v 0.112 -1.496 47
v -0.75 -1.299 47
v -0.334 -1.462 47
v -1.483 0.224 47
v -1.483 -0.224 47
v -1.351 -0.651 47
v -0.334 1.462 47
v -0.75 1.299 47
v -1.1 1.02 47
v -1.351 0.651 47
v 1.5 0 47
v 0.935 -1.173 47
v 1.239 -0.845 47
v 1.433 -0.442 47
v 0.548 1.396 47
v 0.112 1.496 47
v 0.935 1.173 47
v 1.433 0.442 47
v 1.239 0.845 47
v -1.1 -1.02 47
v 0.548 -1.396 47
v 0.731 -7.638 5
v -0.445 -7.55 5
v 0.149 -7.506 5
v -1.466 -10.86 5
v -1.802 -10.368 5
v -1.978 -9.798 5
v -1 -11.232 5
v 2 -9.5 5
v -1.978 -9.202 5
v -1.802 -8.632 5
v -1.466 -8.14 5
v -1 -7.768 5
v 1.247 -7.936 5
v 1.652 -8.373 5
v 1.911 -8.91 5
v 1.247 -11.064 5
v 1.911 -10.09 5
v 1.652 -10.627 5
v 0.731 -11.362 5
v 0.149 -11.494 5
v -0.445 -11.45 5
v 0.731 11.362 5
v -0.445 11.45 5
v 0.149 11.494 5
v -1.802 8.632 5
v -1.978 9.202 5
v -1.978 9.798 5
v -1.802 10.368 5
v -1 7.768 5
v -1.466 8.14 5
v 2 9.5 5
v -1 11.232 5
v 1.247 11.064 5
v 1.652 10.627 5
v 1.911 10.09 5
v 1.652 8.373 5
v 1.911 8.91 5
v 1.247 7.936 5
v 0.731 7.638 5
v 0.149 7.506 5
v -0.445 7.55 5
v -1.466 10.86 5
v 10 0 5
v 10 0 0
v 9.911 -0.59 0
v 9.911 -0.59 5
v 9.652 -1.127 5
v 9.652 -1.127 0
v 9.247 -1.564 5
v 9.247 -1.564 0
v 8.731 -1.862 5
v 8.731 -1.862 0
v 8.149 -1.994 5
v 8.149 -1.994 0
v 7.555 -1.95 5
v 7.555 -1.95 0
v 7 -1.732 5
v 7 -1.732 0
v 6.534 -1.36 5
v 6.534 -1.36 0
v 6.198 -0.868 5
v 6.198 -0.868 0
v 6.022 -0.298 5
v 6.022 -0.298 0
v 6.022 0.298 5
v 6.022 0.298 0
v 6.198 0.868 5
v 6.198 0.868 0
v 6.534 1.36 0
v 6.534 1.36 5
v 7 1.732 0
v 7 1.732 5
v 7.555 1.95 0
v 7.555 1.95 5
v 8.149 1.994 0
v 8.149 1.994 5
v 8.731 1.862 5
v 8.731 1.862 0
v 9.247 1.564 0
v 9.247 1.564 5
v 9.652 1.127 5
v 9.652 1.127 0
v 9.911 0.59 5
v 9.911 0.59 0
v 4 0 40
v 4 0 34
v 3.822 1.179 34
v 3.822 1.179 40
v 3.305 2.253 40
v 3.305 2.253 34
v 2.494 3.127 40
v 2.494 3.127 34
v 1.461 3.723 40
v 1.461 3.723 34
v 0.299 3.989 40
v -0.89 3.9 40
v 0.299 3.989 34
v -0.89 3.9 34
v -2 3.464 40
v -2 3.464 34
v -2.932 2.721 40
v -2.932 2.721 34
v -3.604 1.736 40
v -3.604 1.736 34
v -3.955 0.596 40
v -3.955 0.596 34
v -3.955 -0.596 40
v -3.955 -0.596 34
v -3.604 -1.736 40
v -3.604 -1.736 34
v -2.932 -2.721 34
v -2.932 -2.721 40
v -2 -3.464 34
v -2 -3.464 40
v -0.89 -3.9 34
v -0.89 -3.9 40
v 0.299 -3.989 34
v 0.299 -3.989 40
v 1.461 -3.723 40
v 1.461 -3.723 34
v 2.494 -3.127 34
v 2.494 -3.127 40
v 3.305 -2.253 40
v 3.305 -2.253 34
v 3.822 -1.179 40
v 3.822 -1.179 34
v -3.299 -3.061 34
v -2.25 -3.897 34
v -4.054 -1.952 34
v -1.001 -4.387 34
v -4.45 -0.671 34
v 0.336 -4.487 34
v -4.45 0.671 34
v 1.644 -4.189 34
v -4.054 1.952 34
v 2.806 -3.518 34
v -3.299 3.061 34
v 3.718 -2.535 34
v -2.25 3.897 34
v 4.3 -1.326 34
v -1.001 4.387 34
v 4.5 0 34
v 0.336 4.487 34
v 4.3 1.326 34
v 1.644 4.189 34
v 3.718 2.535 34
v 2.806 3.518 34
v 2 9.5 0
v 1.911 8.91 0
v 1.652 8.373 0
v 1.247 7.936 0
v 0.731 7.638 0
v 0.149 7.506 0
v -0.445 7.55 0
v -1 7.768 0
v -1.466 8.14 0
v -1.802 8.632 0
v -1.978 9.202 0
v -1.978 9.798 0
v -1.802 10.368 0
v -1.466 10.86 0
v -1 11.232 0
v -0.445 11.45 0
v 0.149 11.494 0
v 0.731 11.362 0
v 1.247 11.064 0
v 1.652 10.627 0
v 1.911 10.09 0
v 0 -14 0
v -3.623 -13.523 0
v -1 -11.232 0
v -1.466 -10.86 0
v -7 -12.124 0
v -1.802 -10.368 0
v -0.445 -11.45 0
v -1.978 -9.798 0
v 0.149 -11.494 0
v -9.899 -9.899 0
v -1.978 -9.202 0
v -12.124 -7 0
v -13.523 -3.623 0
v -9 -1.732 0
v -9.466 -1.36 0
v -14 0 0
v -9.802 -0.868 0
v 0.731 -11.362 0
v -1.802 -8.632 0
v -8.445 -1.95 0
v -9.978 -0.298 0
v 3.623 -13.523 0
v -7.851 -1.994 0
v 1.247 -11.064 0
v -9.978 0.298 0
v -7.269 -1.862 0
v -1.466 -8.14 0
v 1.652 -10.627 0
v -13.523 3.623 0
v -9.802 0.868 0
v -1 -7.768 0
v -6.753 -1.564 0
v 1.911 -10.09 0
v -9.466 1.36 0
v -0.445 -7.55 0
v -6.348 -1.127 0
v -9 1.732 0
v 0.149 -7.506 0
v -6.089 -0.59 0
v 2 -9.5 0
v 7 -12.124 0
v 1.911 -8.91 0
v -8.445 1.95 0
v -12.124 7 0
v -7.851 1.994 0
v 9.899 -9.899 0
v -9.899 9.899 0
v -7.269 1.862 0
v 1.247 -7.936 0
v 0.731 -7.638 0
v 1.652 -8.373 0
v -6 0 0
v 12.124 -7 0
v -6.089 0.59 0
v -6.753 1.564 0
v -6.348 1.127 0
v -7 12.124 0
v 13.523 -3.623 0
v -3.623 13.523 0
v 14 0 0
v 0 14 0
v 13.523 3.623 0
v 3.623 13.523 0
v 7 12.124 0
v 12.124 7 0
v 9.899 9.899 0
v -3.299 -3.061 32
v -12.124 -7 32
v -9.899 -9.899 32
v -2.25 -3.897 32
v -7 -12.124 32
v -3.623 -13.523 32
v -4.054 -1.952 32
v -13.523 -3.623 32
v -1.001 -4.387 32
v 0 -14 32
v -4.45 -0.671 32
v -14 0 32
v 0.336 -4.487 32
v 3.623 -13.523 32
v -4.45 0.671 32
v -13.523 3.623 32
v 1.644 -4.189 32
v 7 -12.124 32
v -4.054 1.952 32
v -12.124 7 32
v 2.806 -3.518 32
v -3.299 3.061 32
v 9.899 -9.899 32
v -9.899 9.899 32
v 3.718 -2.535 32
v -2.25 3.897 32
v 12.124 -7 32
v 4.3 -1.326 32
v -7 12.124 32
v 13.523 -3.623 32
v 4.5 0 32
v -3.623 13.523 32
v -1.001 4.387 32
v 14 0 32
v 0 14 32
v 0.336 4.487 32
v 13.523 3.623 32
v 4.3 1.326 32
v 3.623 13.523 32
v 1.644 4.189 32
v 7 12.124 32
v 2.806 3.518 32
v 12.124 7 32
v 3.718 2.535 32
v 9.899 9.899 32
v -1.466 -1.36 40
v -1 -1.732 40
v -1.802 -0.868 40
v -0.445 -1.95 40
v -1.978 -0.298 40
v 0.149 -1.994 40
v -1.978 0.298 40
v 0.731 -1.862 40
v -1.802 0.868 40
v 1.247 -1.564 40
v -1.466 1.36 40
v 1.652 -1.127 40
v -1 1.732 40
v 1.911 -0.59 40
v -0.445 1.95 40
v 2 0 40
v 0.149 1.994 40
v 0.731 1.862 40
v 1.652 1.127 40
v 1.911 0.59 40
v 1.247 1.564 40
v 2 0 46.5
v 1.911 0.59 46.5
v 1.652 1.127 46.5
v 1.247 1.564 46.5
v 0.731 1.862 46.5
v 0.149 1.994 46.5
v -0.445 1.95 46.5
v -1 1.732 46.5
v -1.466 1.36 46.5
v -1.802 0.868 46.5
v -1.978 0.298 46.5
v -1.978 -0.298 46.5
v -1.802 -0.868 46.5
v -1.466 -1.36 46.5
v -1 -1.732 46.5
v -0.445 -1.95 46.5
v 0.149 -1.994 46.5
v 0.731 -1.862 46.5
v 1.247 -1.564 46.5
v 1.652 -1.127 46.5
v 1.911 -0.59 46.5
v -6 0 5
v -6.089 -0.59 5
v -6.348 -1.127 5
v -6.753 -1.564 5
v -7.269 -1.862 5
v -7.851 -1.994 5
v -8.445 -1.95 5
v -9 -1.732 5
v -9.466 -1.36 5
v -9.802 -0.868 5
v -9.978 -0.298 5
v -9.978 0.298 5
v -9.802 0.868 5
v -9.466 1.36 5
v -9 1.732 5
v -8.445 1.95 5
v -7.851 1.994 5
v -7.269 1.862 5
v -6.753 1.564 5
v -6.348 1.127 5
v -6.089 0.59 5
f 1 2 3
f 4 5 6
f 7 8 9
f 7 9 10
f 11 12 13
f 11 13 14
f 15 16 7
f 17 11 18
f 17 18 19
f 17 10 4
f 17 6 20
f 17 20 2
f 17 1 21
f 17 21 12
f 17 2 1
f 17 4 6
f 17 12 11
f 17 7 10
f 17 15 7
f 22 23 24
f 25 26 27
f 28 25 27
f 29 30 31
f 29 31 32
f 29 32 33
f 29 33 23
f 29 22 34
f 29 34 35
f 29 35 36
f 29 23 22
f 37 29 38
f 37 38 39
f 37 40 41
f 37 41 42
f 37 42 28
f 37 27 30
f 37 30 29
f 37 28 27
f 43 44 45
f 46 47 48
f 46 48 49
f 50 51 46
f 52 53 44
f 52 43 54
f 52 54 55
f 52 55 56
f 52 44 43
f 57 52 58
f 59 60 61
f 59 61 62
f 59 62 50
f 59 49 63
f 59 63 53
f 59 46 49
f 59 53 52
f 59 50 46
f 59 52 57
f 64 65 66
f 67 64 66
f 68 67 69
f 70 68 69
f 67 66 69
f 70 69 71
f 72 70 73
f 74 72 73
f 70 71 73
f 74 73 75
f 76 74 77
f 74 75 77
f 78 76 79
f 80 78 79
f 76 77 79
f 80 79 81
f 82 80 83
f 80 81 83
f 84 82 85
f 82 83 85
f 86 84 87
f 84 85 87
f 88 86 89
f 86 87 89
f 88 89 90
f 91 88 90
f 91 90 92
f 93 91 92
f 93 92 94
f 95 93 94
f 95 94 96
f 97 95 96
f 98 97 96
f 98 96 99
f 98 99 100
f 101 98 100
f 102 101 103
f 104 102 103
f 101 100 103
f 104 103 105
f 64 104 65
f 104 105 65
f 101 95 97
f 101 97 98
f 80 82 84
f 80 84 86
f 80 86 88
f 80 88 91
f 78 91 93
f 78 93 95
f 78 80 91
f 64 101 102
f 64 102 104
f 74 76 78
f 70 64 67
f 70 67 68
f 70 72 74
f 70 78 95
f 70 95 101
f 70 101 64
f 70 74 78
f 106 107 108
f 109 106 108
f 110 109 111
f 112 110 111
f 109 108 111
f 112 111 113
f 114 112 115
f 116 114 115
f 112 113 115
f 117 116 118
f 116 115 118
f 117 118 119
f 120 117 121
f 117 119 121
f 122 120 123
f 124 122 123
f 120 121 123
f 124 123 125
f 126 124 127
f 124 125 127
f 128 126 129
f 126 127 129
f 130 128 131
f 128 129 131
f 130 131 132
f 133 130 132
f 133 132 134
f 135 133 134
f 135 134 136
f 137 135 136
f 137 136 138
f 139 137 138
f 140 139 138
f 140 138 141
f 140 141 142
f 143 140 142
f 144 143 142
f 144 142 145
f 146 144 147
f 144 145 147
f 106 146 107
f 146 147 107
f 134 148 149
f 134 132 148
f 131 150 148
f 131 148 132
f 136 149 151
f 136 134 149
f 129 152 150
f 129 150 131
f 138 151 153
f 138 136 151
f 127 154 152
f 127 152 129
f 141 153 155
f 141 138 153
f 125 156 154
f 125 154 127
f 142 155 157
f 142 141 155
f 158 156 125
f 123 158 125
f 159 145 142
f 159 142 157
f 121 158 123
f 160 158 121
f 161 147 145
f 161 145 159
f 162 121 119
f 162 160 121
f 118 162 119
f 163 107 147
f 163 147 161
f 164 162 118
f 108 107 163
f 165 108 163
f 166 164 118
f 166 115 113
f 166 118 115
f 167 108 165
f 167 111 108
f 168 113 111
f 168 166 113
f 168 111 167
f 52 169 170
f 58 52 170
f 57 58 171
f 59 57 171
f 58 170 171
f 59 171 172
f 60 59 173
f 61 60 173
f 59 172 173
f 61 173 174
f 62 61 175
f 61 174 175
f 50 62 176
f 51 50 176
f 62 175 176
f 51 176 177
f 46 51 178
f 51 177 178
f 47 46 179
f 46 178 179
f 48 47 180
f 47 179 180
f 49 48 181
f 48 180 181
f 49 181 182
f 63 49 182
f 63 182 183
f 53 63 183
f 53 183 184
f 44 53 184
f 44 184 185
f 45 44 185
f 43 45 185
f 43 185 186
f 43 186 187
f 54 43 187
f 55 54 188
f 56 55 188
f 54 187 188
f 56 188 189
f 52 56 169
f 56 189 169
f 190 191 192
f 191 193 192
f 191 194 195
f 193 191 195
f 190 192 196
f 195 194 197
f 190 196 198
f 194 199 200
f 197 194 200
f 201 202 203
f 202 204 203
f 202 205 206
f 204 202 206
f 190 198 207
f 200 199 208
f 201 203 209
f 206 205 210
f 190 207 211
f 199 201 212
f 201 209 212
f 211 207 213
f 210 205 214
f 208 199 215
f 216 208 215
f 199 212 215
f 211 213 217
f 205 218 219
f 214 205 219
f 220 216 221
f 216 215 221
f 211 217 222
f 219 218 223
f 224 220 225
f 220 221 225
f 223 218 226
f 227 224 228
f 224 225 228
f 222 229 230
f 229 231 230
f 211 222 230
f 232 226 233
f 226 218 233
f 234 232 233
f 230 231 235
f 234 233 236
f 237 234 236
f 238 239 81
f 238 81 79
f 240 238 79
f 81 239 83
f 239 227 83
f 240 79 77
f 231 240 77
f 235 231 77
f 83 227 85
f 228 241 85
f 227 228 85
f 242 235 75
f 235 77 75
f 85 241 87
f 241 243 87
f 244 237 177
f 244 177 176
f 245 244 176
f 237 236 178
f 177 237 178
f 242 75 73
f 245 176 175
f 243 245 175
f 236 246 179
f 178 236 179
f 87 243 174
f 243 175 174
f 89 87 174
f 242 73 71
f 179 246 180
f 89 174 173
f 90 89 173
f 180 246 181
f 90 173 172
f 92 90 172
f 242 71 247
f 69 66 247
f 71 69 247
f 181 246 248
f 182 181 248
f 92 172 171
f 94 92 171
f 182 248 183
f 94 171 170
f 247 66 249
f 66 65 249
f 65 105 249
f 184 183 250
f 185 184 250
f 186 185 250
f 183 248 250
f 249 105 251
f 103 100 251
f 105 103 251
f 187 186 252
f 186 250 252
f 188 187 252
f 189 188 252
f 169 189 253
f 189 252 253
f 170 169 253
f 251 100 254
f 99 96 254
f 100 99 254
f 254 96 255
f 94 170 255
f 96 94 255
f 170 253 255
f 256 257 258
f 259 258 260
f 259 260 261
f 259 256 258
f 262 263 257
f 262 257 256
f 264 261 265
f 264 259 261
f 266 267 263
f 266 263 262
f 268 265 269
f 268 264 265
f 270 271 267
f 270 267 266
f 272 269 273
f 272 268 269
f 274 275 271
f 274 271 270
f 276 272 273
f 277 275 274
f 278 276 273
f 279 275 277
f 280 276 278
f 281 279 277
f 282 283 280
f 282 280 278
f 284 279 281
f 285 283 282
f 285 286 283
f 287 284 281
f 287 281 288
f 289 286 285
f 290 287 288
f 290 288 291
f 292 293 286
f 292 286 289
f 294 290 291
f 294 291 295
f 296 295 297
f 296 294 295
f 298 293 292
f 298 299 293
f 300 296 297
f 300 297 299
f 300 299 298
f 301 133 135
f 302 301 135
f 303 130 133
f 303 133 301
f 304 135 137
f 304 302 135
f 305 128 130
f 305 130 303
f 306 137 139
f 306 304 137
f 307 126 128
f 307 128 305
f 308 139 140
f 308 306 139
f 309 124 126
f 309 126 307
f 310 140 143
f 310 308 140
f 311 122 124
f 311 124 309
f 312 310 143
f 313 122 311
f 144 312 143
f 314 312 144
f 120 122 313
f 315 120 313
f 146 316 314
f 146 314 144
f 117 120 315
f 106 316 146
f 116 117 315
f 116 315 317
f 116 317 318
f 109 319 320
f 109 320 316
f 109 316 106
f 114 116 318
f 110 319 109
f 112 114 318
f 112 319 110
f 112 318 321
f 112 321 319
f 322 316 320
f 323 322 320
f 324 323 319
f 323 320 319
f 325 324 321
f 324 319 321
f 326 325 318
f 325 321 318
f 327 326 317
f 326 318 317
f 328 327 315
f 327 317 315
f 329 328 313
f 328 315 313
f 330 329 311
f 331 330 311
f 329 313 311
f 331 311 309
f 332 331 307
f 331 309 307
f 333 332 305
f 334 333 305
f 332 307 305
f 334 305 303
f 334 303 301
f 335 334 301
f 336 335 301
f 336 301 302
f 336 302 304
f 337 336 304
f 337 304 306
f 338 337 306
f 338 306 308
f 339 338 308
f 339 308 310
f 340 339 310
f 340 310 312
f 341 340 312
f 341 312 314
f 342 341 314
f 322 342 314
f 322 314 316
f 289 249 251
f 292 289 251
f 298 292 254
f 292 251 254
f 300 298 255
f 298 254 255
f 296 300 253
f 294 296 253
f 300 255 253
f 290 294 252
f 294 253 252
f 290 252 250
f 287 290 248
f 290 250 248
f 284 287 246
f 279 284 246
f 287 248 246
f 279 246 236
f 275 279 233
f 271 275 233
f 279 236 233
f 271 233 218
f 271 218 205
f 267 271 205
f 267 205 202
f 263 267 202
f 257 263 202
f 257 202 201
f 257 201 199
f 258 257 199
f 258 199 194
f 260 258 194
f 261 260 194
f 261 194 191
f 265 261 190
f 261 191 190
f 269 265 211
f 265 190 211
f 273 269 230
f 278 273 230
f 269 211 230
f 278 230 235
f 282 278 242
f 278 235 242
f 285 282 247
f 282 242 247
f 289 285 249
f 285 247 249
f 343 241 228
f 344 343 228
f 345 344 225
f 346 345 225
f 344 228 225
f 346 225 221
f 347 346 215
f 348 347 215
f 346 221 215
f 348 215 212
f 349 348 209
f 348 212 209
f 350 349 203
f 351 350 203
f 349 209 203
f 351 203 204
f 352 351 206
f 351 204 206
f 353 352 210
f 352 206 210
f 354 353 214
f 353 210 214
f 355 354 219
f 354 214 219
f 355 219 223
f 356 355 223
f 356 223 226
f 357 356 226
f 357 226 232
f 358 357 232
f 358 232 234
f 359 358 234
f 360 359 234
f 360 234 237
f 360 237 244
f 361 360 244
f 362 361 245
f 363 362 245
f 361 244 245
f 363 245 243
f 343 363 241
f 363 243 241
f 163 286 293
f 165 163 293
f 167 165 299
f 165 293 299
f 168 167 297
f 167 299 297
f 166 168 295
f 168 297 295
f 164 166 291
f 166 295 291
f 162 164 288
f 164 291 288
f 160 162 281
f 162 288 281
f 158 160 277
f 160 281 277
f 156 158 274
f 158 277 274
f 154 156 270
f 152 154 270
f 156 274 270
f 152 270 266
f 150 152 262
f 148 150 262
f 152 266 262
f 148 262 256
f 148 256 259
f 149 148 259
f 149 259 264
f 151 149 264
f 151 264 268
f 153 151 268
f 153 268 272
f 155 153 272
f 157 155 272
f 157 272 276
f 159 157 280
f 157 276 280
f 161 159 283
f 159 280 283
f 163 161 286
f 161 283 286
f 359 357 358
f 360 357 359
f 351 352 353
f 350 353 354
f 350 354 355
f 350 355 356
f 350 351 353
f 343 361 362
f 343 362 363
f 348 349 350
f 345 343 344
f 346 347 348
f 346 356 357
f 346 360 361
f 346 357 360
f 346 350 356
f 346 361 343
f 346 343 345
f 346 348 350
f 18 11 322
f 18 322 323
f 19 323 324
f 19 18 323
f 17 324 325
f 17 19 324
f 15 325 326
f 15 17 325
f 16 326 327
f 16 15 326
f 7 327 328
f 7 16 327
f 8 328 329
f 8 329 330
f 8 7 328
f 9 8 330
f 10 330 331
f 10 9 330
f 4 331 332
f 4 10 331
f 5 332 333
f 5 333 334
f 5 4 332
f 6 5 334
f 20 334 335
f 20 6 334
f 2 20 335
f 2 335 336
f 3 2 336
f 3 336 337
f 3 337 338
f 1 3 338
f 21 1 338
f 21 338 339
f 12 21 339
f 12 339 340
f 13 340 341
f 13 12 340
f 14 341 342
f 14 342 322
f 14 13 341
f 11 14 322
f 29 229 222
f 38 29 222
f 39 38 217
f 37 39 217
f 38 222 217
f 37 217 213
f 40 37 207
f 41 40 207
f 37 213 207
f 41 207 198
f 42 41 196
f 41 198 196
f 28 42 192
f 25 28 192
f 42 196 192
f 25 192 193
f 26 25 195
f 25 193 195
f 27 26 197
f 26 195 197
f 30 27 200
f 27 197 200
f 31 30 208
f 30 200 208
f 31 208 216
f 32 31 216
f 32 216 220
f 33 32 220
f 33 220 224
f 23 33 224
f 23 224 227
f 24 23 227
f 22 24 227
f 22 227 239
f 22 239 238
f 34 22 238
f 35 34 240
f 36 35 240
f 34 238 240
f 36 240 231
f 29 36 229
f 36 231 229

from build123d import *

# Parameters (mm, degrees)
F0_R      = 14
F1_DEPTH  = 32
F2_R      = 4.5
F3_DEPTH  = 2
F4_R      = 2
F5_DEPTH  = 13
F6_SIZE   = 0.5
F7_R      = 2
F8_DEPTH  = 5
F10_R     = 4
F11_DEPTH = 6


with BuildPart() as f1:
    # F0 (on Top) → F1 (new body)
    with BuildSketch(Plane.XY):
        Circle(F0_R)
    extrude(amount=F1_DEPTH)

    # F2 (on face) → F3 (join)
    with BuildSketch(Plane.XY.offset(32)):
        Circle(F2_R)
    extrude(amount=F3_DEPTH)

    # F4 (on face) → F5 (join)
    with BuildSketch(Plane.XY.offset(34)):
        Circle(F4_R)
    extrude(amount=F5_DEPTH)

    # F6
    f6_edges = [f1.edges().sort_by_distance(p)[0] for p in [
        (-2, 0, 47),
    ]]
    chamfer(f6_edges, length=F6_SIZE)

    # F7 (on face) → F8 (cut)
    with BuildSketch(Plane(origin=(0, 0, 0), x_dir=(1, 0, 0), z_dir=(0, 0, -1))):
        with Locations((-8, 0)):
            Circle(F7_R)
        with Locations((8, 0)):
            Circle(F7_R)
        with Locations((0, 9.5)):
            Circle(F7_R)
        with Locations((0, -9.5)):
            Circle(F7_R)
    extrude(amount=-F8_DEPTH, mode=Mode.SUBTRACT)

    # F10 (on face) → F11 (join)
    with BuildSketch(Plane.XY.offset(34)):
        Circle(F10_R)
    extrude(amount=F11_DEPTH)


solid = f1.part
